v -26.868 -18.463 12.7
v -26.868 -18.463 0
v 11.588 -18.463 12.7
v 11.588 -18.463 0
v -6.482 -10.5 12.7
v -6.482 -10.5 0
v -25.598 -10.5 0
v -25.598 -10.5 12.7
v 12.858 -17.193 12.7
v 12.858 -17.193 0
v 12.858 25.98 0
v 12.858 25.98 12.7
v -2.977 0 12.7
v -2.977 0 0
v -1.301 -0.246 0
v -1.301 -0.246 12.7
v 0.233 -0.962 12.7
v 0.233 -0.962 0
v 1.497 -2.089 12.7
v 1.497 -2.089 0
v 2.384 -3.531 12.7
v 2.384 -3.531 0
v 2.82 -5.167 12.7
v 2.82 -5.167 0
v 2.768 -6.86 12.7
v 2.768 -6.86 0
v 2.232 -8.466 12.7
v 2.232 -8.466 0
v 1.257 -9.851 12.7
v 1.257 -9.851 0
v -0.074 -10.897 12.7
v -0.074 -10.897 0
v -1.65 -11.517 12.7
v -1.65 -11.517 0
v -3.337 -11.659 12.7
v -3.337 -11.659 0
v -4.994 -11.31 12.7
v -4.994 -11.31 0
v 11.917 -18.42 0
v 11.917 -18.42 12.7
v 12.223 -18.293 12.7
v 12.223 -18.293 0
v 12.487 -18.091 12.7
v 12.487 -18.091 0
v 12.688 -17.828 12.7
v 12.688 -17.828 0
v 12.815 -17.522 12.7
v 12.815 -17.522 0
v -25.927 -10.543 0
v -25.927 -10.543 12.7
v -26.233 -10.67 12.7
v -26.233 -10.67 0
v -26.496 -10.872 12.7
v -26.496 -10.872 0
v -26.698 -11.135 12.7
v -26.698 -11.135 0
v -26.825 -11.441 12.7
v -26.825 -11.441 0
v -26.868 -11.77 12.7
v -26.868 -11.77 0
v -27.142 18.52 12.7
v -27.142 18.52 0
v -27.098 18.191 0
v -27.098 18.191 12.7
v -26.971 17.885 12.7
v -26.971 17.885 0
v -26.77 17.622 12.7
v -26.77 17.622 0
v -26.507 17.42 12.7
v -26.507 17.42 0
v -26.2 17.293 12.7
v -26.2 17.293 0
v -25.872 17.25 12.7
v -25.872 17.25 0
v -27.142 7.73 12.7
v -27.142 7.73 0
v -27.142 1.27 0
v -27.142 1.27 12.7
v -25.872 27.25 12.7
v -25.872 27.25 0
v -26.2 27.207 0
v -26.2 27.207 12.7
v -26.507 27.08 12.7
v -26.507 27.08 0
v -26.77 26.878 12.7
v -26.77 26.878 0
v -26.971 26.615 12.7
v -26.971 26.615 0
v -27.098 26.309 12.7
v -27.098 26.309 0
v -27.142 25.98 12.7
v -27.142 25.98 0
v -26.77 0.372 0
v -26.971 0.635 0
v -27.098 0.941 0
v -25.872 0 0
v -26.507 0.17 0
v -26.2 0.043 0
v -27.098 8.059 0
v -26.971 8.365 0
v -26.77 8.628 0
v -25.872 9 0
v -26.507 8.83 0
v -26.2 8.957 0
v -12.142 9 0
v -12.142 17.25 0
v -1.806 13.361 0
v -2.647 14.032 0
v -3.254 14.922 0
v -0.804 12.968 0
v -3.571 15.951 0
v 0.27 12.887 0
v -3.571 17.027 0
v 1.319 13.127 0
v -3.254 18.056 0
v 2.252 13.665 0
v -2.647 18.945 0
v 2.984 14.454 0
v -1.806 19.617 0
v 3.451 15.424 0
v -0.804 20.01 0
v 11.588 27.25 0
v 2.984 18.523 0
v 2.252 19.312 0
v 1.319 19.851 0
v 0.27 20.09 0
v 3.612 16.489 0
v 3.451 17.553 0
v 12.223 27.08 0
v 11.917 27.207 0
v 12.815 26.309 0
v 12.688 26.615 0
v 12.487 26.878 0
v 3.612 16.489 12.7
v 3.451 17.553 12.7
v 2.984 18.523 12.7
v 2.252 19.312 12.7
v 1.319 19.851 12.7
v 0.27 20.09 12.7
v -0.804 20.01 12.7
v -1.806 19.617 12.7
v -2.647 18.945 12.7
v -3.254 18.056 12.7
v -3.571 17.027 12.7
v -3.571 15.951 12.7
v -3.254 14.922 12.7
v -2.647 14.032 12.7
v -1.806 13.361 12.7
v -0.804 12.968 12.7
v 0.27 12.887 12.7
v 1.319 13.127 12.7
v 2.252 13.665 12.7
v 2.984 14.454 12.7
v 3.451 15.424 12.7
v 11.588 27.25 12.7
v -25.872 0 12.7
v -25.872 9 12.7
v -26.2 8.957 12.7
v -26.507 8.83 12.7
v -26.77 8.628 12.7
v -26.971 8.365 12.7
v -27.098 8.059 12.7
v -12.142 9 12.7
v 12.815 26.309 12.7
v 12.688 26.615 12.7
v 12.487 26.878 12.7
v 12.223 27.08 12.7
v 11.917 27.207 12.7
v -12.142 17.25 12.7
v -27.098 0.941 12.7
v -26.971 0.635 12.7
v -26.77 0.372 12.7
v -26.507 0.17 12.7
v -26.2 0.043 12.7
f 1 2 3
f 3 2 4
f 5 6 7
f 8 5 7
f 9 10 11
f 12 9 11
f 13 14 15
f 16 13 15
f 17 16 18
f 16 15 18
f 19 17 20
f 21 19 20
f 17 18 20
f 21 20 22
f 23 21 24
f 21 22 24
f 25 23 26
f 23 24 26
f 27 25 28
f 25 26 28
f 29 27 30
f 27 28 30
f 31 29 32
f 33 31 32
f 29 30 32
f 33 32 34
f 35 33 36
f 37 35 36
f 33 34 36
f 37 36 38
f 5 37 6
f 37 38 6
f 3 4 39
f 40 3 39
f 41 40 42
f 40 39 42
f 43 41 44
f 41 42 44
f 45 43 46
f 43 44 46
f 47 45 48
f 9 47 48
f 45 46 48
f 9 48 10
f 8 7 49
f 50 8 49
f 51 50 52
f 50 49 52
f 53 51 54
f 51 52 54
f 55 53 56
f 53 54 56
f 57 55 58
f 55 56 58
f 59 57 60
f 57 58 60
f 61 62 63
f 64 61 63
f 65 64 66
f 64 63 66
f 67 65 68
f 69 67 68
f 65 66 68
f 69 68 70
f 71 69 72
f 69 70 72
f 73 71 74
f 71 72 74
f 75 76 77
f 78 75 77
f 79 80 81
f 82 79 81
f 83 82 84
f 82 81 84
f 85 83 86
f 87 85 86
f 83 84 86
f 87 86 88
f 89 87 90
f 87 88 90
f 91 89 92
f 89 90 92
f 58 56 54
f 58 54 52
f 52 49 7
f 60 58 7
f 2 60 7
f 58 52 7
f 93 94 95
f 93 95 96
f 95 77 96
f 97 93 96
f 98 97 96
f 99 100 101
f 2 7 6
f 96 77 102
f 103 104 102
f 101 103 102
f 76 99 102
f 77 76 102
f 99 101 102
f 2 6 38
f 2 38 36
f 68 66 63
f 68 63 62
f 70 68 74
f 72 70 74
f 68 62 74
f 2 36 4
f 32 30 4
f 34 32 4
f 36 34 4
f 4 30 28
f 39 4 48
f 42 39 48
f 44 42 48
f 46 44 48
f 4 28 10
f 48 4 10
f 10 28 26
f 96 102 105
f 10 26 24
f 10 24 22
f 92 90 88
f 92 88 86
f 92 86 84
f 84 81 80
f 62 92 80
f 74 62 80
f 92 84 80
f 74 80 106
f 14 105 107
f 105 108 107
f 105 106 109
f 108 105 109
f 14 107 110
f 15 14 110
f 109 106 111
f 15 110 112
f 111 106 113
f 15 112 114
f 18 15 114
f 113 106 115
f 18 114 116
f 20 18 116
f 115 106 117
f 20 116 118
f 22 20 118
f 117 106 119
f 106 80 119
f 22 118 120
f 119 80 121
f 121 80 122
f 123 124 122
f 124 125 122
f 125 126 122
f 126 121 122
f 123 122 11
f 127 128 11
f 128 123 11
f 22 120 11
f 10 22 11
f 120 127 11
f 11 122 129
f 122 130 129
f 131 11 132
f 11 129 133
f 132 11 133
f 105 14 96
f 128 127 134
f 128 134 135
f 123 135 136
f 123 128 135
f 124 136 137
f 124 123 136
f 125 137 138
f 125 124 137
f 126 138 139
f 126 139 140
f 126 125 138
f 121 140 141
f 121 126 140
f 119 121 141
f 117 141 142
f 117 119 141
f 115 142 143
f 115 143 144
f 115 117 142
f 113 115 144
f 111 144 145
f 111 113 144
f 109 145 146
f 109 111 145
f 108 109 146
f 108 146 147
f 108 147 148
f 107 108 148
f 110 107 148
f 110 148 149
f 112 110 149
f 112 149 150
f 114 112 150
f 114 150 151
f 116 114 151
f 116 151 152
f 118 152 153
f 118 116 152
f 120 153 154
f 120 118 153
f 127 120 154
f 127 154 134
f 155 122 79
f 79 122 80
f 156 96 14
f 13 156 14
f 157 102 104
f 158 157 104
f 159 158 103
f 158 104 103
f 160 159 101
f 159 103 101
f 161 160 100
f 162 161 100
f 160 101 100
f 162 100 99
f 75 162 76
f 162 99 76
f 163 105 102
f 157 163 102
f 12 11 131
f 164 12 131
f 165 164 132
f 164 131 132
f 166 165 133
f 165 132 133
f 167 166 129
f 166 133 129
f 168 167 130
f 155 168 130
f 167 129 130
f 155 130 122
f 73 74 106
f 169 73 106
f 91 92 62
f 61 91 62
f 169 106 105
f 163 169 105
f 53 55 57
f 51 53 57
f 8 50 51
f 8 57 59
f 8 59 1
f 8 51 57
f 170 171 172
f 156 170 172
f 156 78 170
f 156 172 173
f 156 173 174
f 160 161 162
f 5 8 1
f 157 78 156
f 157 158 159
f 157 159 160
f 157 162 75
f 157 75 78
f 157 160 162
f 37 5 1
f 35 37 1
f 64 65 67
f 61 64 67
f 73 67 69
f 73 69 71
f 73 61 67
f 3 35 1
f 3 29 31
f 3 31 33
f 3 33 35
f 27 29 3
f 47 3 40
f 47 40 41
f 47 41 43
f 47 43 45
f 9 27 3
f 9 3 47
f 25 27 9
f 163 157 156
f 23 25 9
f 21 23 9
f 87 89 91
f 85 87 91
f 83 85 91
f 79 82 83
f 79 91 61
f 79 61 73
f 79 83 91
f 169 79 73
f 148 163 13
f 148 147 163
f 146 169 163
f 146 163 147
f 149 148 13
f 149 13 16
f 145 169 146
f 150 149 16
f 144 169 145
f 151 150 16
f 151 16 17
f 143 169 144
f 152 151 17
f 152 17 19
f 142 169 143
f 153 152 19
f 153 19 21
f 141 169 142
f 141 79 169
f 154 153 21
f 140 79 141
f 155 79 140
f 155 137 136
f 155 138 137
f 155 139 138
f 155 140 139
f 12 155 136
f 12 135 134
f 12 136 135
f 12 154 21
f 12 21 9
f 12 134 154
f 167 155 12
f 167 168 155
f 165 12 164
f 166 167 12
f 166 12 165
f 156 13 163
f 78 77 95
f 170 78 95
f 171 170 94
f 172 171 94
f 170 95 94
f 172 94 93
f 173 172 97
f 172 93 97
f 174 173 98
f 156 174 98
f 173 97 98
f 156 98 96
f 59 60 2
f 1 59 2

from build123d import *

# Parameters (mm, degrees)
F0_R     = 3.611542
F1_DEPTH = 12.7


with BuildPart() as f1:
    # F0 (on Top) → F1 (new body)
    with BuildSketch(Plane.XY):
        with BuildLine():
            Line((11.588495, 27.25), (-25.871505, 27.25))
            ThreePointArc((-25.871505, 27.25), (-26.769531, 26.878026), (-27.141505, 25.98))
            Line((-27.141505, 25.98), (-27.141505, 18.52))
            ThreePointArc((-27.141505, 18.52), (-26.769531, 17.621974), (-25.871505, 17.25))
            Line((-25.871505, 17.25), (-12.141505, 17.25))
            Line((-12.141505, 17.25), (-12.141505, 9))
            Line((-12.141505, 9), (-25.871505, 9))
            ThreePointArc((-25.871505, 9), (-26.769531, 8.628026), (-27.141505, 7.73))
            Line((-27.141505, 7.73), (-27.141505, 1.27))
            ThreePointArc((-27.141505, 1.27), (-26.769531, 0.371974), (-25.871505, 0))
            Line((-25.871505, 0), (-2.976505, 0))
            ThreePointArc((-2.976505, 0), (2.558271, -7.682559), (-6.481502, -10.5))
            Line((-6.481502, -10.5), (-25.598086, -10.5))
            ThreePointArc((-25.598086, -10.5), (-26.496112, -10.871974), (-26.868086, -11.77))
            Line((-26.868086, -11.77), (-26.868086, -18.462964))
            Line((-26.868086, -18.462964), (11.588495, -18.462964))
            ThreePointArc((11.588495, -18.462964), (12.486521, -18.09099), (12.858495, -17.192964))
            Line((12.858495, -17.192964), (12.858495, 25.98))
            ThreePointArc((12.858495, 25.98), (12.486521, 26.878026), (11.588495, 27.25))
        make_face()
        with Locations((0, 16.488843)):
            Circle(F0_R, mode=Mode.SUBTRACT)
    extrude(amount=F1_DEPTH)


solid = f1.part
